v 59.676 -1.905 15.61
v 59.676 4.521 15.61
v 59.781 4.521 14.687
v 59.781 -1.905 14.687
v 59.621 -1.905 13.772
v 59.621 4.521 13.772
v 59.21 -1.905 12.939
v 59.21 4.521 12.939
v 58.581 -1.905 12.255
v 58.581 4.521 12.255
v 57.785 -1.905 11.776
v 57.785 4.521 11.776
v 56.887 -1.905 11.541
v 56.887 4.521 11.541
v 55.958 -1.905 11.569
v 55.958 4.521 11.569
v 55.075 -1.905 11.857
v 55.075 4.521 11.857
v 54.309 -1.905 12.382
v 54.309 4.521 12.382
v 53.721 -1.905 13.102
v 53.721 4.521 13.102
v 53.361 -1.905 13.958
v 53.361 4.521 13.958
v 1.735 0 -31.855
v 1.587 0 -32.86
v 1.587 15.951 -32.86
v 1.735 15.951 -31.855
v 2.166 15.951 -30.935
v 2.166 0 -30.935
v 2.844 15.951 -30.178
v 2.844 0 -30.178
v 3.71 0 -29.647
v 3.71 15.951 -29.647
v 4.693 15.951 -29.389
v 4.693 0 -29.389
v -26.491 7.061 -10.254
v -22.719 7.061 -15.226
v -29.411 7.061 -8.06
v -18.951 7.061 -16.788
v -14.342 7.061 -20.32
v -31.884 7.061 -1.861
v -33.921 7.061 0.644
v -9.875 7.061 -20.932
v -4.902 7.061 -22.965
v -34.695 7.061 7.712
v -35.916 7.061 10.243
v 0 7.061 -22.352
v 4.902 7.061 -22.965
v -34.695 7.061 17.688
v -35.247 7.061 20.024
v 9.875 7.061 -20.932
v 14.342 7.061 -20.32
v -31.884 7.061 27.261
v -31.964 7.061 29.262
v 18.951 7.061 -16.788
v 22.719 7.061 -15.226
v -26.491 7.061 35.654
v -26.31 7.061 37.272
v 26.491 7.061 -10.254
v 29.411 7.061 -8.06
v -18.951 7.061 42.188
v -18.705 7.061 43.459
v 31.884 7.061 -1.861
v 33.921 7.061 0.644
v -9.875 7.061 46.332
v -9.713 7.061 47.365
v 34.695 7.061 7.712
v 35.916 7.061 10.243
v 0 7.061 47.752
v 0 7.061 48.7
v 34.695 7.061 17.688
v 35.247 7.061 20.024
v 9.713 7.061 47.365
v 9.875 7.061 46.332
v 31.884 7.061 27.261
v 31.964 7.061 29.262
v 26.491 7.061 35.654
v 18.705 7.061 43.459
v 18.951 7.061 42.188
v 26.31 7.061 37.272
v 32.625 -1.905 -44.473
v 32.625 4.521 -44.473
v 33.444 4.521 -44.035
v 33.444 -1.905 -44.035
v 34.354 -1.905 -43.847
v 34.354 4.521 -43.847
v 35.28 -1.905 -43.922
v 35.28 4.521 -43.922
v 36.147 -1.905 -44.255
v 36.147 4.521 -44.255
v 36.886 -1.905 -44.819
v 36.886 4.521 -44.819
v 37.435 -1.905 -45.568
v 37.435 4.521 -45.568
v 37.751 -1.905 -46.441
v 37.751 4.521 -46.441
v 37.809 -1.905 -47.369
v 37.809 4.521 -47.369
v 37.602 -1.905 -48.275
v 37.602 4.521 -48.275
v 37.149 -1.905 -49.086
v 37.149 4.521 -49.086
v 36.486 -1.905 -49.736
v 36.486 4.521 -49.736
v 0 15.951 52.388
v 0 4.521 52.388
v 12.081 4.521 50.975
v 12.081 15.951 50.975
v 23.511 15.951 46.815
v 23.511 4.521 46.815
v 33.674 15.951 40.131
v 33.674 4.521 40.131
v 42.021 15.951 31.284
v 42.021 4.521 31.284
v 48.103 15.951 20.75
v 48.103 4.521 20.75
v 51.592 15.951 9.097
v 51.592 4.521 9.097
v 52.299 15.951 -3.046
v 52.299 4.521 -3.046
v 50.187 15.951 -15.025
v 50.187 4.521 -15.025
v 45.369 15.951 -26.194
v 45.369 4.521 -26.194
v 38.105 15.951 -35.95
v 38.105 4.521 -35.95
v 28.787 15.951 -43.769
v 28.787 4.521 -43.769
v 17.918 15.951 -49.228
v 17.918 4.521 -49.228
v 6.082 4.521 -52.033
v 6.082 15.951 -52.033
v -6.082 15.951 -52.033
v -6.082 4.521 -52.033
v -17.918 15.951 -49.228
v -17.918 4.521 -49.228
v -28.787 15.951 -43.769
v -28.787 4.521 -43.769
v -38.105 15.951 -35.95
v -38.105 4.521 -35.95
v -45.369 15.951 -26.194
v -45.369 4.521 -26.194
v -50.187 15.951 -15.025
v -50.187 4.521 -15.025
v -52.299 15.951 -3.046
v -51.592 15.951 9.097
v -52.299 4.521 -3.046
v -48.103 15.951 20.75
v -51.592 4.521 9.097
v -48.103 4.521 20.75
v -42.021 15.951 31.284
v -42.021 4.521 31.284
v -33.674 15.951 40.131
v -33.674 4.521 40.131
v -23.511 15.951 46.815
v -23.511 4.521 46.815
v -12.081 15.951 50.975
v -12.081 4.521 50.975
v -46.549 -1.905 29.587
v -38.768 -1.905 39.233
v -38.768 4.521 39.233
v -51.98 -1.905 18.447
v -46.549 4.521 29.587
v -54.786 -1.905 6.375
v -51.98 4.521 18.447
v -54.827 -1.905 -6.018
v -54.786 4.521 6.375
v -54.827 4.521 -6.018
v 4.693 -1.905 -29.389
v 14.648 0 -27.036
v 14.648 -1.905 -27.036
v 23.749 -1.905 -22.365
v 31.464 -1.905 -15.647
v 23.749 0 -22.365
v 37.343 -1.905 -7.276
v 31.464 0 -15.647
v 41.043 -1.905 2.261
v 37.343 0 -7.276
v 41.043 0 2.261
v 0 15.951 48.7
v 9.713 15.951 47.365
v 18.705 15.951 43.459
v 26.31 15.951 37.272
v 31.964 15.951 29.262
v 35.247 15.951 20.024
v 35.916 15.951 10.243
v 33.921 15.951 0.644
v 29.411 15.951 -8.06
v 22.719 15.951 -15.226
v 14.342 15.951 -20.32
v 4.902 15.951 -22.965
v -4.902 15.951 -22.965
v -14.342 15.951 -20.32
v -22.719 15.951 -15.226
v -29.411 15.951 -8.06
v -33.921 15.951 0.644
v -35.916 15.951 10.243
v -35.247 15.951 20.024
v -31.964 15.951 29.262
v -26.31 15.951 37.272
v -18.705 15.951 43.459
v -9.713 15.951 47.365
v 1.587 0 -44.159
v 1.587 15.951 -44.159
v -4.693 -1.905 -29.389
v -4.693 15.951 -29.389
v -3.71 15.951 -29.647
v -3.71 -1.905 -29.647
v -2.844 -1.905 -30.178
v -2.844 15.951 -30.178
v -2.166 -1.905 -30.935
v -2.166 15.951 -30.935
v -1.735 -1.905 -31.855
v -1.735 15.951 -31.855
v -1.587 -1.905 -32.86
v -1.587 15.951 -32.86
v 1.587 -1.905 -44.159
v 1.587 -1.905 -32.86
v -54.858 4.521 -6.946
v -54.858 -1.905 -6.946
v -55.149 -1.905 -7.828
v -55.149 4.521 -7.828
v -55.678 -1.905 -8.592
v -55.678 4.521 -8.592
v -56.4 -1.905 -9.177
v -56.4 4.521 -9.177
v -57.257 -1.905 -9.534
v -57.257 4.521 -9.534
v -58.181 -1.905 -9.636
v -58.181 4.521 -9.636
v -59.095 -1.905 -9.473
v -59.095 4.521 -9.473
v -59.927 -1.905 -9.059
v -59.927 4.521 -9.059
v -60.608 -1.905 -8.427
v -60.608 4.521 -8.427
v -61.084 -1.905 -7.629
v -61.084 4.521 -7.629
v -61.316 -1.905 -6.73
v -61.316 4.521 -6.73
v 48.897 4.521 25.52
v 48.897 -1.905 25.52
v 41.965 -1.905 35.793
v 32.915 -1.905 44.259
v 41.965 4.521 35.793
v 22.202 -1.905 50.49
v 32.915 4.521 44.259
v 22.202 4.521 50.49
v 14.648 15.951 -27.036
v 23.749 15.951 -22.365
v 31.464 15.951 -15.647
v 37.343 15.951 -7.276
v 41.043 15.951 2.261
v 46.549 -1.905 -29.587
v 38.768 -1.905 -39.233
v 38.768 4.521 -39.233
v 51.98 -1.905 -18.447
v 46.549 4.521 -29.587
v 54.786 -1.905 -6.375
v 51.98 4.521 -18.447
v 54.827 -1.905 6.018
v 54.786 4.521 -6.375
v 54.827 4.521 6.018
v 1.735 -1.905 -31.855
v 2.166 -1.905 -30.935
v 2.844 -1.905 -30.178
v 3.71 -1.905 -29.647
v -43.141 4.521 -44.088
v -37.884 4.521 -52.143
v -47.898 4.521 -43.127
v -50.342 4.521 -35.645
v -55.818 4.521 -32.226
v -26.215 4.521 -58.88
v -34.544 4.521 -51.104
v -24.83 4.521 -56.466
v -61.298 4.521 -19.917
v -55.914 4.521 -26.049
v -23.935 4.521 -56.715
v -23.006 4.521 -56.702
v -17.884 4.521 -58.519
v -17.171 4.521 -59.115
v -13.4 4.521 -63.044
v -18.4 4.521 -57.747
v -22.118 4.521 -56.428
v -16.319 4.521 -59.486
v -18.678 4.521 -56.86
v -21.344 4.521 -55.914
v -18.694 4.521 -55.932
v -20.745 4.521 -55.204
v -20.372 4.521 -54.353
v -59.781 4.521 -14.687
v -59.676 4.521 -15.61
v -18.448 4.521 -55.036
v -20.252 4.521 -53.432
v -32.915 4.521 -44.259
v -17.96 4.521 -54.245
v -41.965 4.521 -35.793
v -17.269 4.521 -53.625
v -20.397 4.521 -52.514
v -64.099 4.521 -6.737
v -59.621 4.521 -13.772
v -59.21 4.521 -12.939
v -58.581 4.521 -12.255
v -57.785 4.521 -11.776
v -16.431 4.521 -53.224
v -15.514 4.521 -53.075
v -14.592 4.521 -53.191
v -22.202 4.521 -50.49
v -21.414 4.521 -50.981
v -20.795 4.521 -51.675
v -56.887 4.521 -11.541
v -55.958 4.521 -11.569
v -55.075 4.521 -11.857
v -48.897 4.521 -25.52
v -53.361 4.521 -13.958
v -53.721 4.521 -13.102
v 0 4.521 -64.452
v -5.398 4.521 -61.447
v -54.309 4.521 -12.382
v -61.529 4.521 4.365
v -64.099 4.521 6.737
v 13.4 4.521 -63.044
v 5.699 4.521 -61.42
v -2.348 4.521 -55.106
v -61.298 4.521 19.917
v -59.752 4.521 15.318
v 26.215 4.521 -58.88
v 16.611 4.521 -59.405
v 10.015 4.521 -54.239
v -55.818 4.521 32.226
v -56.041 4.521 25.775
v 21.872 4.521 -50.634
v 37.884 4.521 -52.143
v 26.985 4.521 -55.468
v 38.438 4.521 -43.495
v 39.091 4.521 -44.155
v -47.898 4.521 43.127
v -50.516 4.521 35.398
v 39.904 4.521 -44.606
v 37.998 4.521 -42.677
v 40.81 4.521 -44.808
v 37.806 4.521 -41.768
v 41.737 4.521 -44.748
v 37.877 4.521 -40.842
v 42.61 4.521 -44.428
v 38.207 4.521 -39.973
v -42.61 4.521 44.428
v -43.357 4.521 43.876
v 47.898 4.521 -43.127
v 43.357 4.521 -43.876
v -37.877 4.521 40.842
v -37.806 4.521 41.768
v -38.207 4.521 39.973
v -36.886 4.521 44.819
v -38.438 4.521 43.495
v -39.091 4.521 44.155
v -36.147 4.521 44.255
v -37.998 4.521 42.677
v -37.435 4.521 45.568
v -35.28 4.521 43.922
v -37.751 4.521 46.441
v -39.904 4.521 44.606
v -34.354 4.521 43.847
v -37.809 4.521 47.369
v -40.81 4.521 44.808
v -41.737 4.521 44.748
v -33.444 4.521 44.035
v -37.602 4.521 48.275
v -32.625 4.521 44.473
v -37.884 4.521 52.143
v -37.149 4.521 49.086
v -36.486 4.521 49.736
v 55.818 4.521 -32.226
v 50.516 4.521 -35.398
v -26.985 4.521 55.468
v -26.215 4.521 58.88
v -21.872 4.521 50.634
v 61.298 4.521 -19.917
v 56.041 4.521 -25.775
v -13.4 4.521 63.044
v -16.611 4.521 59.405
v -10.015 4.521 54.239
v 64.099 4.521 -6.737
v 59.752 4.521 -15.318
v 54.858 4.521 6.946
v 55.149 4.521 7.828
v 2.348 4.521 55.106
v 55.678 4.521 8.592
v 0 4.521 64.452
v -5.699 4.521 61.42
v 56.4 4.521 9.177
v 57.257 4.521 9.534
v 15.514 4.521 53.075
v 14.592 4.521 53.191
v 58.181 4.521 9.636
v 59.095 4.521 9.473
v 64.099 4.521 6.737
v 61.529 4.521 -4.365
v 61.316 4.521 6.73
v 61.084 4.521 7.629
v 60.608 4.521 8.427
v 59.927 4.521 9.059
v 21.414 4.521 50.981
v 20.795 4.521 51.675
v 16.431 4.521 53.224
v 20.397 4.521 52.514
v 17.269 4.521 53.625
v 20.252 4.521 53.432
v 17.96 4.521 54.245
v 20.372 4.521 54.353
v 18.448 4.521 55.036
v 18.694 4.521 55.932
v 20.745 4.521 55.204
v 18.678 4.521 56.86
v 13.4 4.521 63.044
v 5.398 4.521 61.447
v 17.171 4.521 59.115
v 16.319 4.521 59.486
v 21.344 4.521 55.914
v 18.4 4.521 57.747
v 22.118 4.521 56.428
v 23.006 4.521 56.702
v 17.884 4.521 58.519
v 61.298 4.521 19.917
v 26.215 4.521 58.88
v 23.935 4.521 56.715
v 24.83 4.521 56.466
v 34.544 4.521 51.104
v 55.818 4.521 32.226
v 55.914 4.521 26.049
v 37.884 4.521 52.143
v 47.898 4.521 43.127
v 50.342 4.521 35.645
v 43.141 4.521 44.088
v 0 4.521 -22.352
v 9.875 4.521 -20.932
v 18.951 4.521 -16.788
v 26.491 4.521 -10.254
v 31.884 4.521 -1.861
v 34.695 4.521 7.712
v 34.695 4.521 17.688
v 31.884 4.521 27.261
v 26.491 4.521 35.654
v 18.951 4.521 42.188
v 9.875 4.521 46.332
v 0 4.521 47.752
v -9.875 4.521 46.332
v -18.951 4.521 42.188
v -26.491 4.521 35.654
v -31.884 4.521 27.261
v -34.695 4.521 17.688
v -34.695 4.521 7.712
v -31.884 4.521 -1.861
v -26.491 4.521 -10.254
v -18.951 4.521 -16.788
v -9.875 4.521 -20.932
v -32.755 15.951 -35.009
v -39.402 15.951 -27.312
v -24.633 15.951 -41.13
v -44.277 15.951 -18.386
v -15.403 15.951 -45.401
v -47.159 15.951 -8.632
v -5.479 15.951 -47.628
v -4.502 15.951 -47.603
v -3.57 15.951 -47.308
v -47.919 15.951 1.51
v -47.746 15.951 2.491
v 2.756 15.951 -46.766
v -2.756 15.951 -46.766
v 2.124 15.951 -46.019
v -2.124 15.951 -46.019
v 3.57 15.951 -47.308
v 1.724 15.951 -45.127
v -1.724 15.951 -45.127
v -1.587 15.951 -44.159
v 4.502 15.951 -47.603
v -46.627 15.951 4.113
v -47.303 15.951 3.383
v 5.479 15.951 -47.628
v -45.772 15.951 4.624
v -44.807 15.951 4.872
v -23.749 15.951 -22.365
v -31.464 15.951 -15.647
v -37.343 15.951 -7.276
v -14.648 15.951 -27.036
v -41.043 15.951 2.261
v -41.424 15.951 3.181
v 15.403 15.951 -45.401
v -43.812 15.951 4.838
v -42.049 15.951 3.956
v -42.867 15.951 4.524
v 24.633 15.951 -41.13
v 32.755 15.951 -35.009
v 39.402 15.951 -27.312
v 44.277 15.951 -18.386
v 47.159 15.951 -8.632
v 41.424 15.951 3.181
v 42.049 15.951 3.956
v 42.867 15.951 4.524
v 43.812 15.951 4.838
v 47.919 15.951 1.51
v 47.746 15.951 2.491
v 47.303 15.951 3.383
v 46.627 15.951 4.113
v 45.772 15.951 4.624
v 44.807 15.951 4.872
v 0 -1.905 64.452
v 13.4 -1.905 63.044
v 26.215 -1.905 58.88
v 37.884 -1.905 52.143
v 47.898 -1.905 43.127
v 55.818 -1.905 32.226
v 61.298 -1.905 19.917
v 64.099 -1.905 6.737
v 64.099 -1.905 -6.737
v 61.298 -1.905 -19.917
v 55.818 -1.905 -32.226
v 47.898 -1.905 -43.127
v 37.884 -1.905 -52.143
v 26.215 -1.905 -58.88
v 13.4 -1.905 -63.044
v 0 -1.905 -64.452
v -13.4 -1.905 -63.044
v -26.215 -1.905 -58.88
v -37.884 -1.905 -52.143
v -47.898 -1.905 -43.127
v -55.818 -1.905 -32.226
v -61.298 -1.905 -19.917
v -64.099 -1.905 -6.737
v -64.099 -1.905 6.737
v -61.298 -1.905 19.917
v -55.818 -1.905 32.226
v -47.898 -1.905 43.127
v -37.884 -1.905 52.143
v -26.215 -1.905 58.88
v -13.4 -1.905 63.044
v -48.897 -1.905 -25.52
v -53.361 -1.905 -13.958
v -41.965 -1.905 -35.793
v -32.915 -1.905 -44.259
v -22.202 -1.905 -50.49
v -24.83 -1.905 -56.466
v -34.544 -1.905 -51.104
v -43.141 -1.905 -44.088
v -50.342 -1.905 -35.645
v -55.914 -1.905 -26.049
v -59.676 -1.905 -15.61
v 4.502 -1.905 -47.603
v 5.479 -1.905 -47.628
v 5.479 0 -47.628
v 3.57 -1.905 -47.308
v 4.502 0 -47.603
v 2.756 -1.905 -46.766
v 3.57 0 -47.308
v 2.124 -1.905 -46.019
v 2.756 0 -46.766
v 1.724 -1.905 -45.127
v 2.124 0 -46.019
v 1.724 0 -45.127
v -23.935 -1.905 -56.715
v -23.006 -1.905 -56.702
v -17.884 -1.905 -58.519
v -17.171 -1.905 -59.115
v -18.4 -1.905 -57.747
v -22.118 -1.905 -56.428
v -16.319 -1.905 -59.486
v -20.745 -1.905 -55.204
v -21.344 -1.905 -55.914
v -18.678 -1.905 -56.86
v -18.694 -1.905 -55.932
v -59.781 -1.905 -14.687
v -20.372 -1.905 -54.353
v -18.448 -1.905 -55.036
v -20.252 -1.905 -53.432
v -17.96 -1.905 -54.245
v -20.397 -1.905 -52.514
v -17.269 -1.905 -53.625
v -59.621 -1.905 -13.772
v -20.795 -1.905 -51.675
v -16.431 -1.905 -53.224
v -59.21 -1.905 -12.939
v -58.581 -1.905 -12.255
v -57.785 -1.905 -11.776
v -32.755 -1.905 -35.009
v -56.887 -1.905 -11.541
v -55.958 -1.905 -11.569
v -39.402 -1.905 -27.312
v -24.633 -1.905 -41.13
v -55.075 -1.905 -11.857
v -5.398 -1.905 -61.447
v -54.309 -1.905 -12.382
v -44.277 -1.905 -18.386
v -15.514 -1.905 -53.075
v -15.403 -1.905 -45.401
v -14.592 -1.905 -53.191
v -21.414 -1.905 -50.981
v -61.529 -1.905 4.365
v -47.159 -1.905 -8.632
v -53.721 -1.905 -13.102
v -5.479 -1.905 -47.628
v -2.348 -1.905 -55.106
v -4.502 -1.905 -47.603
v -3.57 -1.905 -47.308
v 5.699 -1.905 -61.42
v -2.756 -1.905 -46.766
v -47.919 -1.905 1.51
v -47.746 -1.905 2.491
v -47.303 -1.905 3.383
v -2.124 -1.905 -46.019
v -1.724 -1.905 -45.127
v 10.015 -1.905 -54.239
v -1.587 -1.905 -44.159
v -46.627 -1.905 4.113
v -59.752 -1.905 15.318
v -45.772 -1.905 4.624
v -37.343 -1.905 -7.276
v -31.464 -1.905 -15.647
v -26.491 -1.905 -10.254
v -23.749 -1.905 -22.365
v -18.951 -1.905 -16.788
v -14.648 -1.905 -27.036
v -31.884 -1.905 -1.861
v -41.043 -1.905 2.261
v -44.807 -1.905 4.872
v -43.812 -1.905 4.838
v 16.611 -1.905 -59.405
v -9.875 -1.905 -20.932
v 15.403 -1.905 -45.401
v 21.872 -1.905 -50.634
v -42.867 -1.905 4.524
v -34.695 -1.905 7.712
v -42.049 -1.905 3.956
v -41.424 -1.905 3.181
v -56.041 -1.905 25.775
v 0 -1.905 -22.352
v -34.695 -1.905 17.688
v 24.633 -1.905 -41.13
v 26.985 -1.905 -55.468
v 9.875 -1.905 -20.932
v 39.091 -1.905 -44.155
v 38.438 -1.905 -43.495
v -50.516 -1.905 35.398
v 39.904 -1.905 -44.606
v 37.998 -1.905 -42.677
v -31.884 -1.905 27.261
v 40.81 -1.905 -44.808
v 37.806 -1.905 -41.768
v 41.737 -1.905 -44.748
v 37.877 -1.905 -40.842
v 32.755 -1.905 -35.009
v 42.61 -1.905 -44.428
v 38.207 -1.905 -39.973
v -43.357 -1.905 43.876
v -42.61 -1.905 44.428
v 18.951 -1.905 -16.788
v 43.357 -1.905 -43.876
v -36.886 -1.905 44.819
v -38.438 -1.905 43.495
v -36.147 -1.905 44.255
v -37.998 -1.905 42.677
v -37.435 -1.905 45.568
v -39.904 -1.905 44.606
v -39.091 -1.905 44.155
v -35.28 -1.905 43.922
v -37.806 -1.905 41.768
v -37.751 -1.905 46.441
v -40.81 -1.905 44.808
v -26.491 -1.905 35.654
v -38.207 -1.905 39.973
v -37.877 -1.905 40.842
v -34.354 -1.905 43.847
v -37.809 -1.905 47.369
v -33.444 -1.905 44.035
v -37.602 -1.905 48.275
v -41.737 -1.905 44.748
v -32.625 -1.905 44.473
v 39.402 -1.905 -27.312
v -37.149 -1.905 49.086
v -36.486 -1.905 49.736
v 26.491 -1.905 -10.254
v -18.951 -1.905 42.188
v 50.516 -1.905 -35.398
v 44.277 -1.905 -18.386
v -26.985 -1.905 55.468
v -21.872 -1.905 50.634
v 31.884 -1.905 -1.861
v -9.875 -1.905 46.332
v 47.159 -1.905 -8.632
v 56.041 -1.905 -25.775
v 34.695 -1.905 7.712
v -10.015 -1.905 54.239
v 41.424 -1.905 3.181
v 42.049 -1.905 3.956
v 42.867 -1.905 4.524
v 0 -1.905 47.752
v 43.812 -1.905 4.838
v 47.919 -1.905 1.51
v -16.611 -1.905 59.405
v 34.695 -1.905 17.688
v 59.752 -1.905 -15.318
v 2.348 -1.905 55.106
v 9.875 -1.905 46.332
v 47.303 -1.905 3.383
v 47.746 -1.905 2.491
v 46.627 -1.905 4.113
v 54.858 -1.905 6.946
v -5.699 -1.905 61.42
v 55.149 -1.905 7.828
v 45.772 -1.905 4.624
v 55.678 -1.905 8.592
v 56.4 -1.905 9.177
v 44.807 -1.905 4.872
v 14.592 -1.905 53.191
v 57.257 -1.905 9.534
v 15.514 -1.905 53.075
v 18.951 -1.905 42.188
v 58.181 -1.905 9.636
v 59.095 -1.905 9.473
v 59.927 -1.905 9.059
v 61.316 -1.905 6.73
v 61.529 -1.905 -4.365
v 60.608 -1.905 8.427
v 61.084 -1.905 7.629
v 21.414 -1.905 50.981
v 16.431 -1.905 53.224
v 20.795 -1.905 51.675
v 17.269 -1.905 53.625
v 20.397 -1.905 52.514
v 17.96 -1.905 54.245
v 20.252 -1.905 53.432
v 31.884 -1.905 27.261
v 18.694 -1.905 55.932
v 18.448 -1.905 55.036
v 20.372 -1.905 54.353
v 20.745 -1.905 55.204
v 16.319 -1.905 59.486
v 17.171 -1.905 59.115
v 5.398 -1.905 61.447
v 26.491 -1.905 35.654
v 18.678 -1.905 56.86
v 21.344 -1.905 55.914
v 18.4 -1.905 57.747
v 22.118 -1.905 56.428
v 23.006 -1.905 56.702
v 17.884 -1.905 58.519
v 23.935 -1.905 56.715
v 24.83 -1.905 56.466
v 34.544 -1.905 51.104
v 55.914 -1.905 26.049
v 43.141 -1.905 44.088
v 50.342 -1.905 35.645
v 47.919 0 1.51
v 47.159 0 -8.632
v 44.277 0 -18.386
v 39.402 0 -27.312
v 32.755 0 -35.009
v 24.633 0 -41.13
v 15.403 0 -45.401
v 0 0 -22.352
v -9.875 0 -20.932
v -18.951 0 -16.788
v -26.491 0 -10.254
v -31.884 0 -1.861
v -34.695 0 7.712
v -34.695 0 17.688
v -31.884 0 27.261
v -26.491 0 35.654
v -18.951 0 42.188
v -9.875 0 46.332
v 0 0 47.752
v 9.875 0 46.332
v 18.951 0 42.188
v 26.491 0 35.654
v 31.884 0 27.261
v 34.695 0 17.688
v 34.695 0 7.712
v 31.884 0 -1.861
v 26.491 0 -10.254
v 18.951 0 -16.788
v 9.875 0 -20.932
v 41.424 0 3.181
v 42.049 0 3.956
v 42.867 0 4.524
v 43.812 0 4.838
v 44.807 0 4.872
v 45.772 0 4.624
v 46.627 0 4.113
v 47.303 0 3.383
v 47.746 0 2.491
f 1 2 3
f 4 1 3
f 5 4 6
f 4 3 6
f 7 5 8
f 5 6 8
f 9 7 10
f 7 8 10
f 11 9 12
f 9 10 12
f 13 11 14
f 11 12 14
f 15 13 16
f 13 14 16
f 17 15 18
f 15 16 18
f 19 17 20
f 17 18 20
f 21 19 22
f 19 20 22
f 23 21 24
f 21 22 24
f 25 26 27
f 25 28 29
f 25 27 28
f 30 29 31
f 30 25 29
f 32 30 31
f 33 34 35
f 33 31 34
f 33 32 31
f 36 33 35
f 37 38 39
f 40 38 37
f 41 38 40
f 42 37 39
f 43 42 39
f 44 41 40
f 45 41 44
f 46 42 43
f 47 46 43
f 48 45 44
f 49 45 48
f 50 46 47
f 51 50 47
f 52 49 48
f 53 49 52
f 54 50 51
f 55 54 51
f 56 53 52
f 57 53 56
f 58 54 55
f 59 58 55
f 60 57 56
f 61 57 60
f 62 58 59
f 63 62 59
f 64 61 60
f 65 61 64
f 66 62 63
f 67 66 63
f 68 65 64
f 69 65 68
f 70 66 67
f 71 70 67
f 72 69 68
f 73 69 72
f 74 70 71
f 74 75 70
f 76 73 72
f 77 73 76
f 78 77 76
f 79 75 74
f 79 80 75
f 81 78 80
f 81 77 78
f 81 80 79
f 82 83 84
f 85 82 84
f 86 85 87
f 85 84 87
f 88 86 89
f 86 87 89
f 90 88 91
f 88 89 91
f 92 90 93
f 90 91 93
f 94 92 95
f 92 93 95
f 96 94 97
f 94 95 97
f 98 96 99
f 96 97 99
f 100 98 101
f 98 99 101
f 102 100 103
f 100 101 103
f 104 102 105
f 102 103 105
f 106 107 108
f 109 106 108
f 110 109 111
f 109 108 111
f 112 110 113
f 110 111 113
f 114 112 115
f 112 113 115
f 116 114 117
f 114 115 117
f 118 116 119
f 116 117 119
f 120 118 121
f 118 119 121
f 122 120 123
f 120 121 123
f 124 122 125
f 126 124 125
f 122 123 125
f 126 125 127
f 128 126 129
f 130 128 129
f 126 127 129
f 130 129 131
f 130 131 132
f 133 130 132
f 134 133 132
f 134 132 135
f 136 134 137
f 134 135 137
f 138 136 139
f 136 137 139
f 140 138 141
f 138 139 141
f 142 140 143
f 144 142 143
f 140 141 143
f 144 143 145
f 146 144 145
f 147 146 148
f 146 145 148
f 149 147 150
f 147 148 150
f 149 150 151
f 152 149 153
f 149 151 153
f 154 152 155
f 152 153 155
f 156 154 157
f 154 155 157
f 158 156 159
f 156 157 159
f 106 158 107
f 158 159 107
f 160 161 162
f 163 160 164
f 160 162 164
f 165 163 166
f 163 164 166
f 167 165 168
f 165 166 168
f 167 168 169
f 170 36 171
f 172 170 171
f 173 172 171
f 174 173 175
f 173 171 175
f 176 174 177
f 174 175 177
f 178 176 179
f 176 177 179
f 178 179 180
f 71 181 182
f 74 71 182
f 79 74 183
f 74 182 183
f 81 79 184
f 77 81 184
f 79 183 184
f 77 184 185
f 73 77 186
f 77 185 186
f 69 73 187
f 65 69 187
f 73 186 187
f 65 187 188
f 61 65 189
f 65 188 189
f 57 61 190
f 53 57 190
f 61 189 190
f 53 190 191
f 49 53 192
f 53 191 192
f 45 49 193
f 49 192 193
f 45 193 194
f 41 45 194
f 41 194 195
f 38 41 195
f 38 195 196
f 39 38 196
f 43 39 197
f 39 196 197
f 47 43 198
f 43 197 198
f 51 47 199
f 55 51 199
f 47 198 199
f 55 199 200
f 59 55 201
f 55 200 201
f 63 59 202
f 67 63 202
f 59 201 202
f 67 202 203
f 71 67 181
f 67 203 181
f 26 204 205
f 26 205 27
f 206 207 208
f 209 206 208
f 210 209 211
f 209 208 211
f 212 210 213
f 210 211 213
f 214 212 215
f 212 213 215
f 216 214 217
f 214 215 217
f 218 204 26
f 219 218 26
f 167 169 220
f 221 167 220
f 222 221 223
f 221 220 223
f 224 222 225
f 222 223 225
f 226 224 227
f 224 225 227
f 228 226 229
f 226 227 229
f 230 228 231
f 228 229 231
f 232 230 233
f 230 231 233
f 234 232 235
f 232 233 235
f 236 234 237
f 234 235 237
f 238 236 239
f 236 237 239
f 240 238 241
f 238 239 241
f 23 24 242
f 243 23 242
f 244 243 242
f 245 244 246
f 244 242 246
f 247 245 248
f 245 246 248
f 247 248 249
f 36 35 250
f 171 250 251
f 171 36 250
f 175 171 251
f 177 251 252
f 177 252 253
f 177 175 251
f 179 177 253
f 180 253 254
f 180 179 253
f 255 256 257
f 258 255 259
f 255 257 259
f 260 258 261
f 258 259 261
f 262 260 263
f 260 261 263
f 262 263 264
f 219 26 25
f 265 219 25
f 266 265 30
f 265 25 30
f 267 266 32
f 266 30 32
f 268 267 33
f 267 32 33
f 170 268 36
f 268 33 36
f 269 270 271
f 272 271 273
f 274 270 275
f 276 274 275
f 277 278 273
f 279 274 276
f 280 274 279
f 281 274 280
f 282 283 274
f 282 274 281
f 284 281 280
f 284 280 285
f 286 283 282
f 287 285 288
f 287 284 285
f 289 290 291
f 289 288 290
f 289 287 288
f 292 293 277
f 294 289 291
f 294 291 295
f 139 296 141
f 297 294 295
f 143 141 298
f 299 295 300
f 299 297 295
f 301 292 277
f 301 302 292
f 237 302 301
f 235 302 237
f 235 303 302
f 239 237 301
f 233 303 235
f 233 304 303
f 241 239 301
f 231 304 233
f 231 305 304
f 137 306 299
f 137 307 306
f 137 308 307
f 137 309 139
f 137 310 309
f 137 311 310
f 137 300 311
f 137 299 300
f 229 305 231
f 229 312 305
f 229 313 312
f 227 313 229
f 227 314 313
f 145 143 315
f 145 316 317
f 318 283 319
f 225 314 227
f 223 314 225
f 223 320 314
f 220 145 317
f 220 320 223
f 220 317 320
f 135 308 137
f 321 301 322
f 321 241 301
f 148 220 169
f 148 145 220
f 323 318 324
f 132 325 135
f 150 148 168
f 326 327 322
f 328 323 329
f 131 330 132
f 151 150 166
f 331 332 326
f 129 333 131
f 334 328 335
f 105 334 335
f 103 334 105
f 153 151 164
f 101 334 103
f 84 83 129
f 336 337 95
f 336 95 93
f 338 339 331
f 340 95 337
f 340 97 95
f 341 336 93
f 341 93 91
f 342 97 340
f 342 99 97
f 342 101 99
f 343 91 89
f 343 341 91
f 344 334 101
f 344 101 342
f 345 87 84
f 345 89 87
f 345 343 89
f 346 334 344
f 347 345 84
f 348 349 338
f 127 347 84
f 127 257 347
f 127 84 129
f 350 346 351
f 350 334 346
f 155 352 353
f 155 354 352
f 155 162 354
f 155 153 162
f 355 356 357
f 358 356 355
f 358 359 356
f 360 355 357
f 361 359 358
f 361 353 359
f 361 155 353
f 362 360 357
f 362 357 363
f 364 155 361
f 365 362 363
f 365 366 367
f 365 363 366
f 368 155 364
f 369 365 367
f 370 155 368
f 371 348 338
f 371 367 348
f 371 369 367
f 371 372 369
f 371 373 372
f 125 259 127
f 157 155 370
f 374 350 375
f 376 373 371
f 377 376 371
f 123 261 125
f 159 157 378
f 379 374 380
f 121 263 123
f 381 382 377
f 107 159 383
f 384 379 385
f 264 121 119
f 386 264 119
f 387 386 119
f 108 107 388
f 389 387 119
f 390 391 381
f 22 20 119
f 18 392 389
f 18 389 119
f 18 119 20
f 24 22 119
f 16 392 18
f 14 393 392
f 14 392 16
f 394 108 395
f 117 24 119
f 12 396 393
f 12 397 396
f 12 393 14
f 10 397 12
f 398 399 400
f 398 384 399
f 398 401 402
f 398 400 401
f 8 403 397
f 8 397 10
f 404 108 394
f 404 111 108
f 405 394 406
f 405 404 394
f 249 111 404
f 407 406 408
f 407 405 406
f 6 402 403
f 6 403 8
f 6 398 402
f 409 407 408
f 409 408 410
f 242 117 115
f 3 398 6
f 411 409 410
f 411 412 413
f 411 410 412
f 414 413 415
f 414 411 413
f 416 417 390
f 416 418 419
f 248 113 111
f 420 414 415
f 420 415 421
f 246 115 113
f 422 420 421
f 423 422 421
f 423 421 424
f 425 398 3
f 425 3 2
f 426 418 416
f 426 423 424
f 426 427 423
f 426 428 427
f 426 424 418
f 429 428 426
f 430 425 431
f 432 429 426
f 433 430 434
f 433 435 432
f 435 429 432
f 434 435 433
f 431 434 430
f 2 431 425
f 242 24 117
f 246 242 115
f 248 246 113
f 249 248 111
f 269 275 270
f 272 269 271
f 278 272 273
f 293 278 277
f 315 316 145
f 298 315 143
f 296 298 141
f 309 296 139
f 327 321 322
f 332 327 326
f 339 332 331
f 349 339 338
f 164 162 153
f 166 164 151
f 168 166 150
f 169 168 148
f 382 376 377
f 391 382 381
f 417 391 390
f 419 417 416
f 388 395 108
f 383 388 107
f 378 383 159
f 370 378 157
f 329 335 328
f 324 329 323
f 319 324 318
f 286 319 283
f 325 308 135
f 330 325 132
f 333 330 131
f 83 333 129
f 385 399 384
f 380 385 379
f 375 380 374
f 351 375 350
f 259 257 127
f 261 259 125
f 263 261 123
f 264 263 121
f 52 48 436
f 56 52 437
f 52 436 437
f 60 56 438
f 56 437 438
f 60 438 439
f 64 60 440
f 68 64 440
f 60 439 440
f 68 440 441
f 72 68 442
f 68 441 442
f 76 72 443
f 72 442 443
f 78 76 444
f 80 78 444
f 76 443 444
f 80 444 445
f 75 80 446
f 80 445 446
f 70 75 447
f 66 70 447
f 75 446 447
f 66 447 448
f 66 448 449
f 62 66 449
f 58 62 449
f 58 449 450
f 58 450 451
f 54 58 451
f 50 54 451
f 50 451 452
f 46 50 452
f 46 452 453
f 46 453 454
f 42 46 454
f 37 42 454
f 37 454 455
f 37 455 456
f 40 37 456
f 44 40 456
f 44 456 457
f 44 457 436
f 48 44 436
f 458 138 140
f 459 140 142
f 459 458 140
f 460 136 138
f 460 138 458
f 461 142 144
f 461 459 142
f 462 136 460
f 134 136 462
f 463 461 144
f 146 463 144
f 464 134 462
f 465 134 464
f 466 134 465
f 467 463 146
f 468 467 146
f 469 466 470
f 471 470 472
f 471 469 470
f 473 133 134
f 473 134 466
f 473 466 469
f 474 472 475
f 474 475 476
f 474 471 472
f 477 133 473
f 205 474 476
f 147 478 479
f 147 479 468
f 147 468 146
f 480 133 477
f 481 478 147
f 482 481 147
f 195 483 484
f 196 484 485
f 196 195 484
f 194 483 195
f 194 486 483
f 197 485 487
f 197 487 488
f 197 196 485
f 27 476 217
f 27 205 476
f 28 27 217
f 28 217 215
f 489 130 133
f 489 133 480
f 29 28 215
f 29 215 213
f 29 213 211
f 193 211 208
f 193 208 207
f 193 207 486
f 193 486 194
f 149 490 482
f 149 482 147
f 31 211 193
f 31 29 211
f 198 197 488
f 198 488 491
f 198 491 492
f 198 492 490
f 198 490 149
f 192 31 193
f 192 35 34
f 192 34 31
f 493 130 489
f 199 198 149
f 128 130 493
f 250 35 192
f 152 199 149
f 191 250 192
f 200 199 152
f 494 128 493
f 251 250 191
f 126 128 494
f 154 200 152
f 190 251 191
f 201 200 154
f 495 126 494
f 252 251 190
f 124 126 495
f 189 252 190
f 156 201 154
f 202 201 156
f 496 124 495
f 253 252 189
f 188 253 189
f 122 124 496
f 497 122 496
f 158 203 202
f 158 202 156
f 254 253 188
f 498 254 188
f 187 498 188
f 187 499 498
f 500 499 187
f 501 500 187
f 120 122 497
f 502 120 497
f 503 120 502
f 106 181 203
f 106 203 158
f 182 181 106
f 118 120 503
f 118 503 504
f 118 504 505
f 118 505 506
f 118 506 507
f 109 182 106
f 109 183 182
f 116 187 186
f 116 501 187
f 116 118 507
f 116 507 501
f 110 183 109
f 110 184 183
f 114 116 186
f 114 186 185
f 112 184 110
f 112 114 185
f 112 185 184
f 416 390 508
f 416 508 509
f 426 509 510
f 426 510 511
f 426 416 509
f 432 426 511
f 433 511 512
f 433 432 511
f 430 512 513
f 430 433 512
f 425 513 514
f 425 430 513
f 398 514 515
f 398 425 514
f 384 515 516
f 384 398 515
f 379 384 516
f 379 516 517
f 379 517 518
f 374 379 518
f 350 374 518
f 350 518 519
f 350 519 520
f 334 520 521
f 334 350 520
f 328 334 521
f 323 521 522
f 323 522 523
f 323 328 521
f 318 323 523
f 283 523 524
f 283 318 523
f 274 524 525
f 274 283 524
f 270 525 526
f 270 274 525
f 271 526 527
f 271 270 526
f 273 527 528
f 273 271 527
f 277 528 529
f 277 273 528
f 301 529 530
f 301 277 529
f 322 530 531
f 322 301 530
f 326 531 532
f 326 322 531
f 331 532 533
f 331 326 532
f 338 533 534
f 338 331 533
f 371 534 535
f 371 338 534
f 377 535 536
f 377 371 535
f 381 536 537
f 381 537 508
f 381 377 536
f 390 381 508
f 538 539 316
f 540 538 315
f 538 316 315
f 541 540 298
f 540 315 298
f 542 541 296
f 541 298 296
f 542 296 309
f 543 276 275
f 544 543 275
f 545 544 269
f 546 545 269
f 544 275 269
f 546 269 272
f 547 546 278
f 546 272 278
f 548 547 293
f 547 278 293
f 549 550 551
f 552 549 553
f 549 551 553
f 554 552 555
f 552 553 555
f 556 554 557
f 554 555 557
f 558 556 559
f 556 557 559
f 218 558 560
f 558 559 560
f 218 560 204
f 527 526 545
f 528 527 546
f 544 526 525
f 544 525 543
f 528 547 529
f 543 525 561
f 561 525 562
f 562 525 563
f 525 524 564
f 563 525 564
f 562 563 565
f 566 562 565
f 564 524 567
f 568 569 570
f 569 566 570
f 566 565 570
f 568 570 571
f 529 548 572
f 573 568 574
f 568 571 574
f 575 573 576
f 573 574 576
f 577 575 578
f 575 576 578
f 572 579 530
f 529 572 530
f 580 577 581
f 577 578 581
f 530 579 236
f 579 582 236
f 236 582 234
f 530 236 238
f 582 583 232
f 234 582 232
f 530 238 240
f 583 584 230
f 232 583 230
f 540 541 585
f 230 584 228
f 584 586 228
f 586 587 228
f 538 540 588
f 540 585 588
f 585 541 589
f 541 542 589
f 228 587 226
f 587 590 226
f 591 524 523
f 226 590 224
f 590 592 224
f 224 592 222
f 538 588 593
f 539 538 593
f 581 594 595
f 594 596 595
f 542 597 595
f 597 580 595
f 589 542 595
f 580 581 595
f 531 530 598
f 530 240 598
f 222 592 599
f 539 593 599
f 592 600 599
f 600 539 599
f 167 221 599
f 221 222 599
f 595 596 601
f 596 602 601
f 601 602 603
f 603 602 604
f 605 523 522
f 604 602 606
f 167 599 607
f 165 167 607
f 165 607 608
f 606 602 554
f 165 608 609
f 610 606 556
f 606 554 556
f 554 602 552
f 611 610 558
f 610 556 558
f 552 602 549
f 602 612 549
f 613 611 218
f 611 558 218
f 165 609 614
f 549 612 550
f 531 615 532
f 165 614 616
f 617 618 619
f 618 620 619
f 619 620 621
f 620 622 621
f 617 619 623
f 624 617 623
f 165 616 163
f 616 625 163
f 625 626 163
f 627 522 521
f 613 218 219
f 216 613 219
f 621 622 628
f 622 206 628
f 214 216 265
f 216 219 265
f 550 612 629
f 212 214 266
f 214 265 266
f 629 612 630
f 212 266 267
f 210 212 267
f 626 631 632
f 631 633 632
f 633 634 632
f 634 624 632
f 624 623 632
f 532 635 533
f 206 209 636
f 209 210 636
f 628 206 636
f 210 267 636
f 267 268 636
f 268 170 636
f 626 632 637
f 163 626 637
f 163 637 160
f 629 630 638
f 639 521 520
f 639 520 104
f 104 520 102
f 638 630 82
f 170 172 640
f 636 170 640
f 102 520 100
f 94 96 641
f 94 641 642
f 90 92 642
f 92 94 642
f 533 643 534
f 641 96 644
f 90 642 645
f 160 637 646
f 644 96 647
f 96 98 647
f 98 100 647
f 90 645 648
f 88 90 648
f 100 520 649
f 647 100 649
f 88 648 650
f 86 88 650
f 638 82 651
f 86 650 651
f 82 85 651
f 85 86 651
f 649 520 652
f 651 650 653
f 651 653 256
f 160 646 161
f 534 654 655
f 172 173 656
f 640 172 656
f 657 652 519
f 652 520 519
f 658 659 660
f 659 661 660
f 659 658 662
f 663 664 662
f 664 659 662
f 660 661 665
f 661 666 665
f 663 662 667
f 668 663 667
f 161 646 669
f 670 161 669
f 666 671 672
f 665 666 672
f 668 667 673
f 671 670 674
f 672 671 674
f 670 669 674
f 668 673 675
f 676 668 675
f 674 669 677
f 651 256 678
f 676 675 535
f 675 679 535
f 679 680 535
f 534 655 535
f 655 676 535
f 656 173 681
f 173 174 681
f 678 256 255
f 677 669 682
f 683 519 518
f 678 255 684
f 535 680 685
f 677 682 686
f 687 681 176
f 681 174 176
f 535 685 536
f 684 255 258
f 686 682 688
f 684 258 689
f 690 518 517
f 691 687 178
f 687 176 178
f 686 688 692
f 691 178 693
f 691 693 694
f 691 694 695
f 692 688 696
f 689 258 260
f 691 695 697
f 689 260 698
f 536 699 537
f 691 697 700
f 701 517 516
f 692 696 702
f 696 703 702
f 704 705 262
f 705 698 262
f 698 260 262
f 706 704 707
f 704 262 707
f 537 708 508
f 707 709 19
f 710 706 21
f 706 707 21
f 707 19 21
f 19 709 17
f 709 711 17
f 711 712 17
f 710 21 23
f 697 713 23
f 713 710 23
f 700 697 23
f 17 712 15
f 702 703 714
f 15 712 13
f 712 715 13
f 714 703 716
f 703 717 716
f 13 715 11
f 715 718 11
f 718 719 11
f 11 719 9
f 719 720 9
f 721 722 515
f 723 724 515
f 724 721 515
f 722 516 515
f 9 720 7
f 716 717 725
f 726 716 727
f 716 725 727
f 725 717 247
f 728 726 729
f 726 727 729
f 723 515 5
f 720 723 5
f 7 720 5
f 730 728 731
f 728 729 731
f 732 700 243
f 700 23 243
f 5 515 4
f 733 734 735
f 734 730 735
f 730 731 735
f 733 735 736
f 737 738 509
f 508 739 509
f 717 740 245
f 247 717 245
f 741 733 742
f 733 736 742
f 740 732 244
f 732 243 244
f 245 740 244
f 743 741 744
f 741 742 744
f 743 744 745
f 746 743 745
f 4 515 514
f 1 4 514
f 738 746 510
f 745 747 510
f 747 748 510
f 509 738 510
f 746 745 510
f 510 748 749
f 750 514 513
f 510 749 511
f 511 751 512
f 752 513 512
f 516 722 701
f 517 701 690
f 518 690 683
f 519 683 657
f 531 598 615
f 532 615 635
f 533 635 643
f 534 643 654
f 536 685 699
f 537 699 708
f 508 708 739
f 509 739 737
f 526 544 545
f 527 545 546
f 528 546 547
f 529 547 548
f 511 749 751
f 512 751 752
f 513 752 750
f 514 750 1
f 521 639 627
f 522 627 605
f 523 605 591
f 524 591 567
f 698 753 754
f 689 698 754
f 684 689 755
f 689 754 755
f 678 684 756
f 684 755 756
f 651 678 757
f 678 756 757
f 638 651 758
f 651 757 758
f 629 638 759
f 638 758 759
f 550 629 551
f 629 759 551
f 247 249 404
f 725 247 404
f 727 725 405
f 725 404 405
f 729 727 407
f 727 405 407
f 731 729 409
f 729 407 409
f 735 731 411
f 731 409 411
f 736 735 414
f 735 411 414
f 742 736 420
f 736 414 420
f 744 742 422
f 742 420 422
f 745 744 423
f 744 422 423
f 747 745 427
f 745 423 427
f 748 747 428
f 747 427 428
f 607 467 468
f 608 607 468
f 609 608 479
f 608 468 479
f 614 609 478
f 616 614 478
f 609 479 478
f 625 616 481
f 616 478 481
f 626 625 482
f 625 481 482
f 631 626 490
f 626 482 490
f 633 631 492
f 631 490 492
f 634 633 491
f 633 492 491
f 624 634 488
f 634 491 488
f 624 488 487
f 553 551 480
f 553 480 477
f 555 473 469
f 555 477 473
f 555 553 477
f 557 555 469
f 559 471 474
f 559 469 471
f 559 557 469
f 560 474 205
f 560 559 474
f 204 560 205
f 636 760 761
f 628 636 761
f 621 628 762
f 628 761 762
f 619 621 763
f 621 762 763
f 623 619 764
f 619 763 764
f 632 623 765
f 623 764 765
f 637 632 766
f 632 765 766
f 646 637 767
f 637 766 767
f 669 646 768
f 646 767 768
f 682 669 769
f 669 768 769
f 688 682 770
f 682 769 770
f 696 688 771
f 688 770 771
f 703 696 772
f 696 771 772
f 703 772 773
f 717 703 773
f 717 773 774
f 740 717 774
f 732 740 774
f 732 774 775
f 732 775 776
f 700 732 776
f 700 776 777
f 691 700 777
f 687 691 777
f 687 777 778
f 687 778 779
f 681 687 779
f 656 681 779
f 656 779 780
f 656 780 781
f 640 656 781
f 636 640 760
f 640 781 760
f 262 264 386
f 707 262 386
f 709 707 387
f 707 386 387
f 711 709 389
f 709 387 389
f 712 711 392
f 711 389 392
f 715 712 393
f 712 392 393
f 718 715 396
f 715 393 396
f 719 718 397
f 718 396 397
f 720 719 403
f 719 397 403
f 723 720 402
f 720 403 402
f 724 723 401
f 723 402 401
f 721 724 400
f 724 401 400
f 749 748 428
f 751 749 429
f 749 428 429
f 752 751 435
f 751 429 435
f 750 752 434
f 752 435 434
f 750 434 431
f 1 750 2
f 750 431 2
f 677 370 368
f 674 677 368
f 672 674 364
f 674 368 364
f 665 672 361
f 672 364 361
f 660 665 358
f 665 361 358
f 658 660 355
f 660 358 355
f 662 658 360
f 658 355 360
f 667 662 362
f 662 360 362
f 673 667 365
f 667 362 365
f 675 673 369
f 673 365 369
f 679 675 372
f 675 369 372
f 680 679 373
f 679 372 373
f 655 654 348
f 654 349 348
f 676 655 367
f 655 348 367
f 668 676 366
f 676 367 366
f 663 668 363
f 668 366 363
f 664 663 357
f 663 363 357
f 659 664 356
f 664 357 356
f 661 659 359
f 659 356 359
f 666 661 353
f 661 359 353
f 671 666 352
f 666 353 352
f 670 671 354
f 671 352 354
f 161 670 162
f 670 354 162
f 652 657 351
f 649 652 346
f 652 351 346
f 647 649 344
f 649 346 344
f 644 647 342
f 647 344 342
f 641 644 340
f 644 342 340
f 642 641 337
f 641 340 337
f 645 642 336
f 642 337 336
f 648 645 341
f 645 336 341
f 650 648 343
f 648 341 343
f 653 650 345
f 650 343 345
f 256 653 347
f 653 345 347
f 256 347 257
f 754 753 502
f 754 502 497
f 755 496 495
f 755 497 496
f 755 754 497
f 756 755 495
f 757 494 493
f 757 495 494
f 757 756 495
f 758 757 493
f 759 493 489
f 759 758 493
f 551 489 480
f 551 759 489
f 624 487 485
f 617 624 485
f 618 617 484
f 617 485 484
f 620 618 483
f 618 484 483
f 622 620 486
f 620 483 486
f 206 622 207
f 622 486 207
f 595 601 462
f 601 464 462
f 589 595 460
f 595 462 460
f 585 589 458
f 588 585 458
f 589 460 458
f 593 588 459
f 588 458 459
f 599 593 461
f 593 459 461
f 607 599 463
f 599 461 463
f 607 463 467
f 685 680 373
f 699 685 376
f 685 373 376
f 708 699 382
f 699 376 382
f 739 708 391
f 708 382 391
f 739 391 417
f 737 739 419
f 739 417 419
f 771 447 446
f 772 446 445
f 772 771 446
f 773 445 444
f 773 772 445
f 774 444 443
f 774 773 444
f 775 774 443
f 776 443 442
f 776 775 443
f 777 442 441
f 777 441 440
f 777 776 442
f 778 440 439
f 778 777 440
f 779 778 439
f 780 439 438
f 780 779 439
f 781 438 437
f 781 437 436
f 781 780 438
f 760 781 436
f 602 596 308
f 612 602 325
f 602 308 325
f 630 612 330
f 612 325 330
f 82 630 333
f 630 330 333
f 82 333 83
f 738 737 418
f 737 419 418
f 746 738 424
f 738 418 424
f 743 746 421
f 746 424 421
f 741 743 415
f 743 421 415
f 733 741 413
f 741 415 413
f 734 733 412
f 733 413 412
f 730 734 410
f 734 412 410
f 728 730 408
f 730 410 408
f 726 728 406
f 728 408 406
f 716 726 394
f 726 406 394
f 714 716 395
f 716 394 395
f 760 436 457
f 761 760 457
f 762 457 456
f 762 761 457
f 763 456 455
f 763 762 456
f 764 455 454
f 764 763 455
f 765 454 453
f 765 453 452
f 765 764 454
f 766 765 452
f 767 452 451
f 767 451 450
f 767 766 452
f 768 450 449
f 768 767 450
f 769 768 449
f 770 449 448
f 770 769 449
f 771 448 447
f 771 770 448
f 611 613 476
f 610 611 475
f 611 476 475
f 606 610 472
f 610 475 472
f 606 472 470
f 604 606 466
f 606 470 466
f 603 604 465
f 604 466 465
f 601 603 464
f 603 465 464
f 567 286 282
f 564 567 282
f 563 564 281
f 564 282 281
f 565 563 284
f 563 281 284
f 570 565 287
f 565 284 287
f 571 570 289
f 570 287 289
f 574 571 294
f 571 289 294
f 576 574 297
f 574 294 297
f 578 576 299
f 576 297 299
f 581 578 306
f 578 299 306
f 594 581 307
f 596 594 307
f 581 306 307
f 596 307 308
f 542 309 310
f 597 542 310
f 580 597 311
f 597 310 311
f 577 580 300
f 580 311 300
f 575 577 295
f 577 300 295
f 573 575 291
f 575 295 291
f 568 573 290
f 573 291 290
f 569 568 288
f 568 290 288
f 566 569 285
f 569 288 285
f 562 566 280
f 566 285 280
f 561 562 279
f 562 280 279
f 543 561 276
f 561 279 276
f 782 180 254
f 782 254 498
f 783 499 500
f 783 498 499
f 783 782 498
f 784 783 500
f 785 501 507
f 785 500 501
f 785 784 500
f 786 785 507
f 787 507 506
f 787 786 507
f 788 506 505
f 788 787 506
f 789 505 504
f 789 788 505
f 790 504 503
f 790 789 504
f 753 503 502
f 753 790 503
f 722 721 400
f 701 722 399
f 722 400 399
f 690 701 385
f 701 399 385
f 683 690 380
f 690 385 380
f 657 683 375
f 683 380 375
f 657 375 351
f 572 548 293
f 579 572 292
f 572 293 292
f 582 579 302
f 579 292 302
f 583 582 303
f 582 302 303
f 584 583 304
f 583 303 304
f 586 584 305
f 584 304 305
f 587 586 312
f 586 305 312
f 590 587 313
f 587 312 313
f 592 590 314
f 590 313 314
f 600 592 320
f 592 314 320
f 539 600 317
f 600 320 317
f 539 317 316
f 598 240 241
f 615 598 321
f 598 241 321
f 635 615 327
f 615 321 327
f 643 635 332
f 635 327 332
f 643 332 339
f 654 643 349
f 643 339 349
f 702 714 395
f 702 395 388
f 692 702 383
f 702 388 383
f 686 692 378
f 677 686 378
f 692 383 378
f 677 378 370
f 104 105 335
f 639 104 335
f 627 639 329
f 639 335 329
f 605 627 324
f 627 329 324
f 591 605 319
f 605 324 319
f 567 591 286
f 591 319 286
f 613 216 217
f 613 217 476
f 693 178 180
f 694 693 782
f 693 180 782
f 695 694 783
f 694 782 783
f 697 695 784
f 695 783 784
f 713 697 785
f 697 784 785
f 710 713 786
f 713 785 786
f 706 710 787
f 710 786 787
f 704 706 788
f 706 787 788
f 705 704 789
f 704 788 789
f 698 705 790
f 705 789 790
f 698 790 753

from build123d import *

# Parameters (mm, degrees)
SKETCH1_R               = 61.912499999999994
SKETCH1_R_2             = 35.05199999999999
BOSS_EXTRUDE1_DEPTH     = 4.521199999999999
SKETCH3_R               = 52.38750000000001
BOSS_EXTRUDE2_DEPTH     = 11.43
SKETCH4_R               = 35.05199999999999
CUT_EXTRUDE1_DEPTH      = 89.99862973068743
SKETCH9_R               = 36.000000009
CUT_EXTRUDE3_DEPTH      = 8.889999999999999
CUT_EXTRUDE6_DEPTH      = 4.5212
CIRPATTERN2_COUNT       = 6
CUT_EXTRUDE7_DEPTH      = 89.99862973068743
CUT_EXTRUDE7_DEPTH_BACK = 89.99862973068743
SKETCH28_R              = 61.912499999999994
BOSS_EXTRUDE6_DEPTH     = 1.9049999999999998
SKETCH29_R              = 64.4525
SKETCH29_R_2            = 61.912499999999994
BOSS_EXTRUDE7_DEPTH     = 6.4262


with BuildPart() as part:
    # Sketch1 → Boss-Extrude1 (new body)
    with BuildSketch(Plane(origin=(0, 0, 0), x_dir=(1, 0, 0), z_dir=(0, 1, 0))):
        with Locations(Location((0, 0, 0), (0, 0, 270))):
            Circle(SKETCH1_R)
        with Locations(Location((0, -12.7, 0), (0, 0, 270))):
            Circle(SKETCH1_R_2, mode=Mode.SUBTRACT)
    extrude(amount=BOSS_EXTRUDE1_DEPTH)

    # Sketch3 → Boss-Extrude2 (add)
    with BuildSketch(Plane(origin=(0, 4.521199999999999, 0), x_dir=(1, 0, 0), z_dir=(0, 1, 0))):
        with Locations(Location((0, 0, 0), (0, 0, 270))):
            Circle(SKETCH3_R)
    extrude(amount=BOSS_EXTRUDE2_DEPTH)

    # Sketch4 → Cut-Extrude1 (cut, through all)
    with BuildSketch(Plane.XZ):
        with Locations(Location((0, 12.7, 0), (0, 0, 270))):
            Circle(SKETCH4_R)
    extrude(amount=-CUT_EXTRUDE1_DEPTH, mode=Mode.SUBTRACT)

    # Sketch9 → Cut-Extrude3 (cut)
    with BuildSketch(Plane(origin=(0, 15.951199999999998, 0), x_dir=(1, 0, 0), z_dir=(0, 1, 0))):
        with Locations(Location((0, -12.7, 0), (0, 0, 270))):
            Circle(SKETCH9_R)
    extrude(amount=-CUT_EXTRUDE3_DEPTH, mode=Mode.SUBTRACT)

    # Sketch26 → Cut-Extrude6 (cut)
    with BuildSketch(Plane(origin=(0, 4.521199999999999, 0), x_dir=(1, 0, 0), z_dir=(0, 1, 0))):
        with BuildLine():
            ThreePointArc((-61.31569012651589, 6.729759543927394), (-58.13186307655321, -20.629833117571987), (-43.356751785354874, -43.87591131626929))
            ThreePointArc((-43.356751785354874, -43.87591131626929), (-38.740981882715914, -43.84844086137017), (-38.76845233761503, -39.23267095873121))
            ThreePointArc((-38.76845233761503, -39.23267095873121), (-51.979963216279714, -18.446647154542955), (-54.82685654096325, 6.017571690194909))
            ThreePointArc((-54.82685654096325, 6.017571690194909), (-57.71517940687332, 9.618082409837466), (-61.31569012651589, 6.729759543927394))
        make_face()
    cut_extrude6 = extrude(amount=-CUT_EXTRUDE6_DEPTH, mode=Mode.SUBTRACT)

    # CirPattern2: Cut-Extrude6 ×6 about axis
    cirpattern2_axis = Axis((1.126e-14, 0, 2.9e-14), (0, 1, 0))
    for i in range(1, CIRPATTERN2_COUNT):
        add(cut_extrude6.rotate(cirpattern2_axis, i * 360 / CIRPATTERN2_COUNT), mode=Mode.SUBTRACT)

    # Sketch27 → Cut-Extrude7 (cut, two sides: drawn at the far end of the back side and taken through both)
    with BuildSketch(Plane(origin=(0, 15.951199999999998, 0), x_dir=(1, 0, 0), z_dir=(0, 1, 0)).offset(-CUT_EXTRUDE7_DEPTH_BACK)):
        with BuildLine():
            Line((-1.5874999999999995, 44.15876017281289), (-1.5874999999999981, 32.860162500535104))
            ThreePointArc((-1.5874999999999981, 32.860162500535104), (-2.4771920261720077, 30.53144033991194), (-4.692981403795235, 29.38917231671267))
            ThreePointArc((-4.692981403795235, 29.38917231671267), (-27.80971442943092, 19.239666311904415), (-41.043217293560936, -2.2608039123771086))
            ThreePointArc((-41.043217293560936, -2.2608039123771086), (-44.807125891813406, -4.871764870752282), (-47.91871765916517, -1.509902033647368))
            ThreePointArc((-47.91871765916517, -1.509902033647368), (-36.283267418970276, 31.337003871676934), (-5.479142857142855, 47.62837704353388))
            ThreePointArc((-5.479142857142855, 47.62837704353388), (-2.7558281236719524, 46.76563211813081), (-1.5874999999999995, 44.15876017281289))
        make_face()
        with BuildLine():
            Line((1.5874999999999995, 44.15876017281289), (1.5874999999999981, 32.860162500535104))
            ThreePointArc((1.5874999999999981, 32.860162500535104), (2.4771920261720073, 30.53144033991194), (4.692981403795235, 29.38917231671267))
            ThreePointArc((4.692981403795235, 29.38917231671267), (27.809714429430915, 19.23966631190442), (41.043217293560936, -2.2608039123771086))
            ThreePointArc((41.043217293560936, -2.2608039123771086), (44.807125891813406, -4.871764870752282), (47.91871765916517, -1.509902033647368))
            ThreePointArc((47.91871765916517, -1.509902033647368), (36.28326741897028, 31.337003871676927), (5.479142857142855, 47.62837704353388))
            ThreePointArc((5.479142857142855, 47.62837704353388), (2.755828123671953, 46.76563211813081), (1.5874999999999995, 44.15876017281289))
        make_face()
    extrude(amount=CUT_EXTRUDE7_DEPTH + CUT_EXTRUDE7_DEPTH_BACK, mode=Mode.SUBTRACT)

    # Sketch28 → Boss-Extrude6 (add)
    with BuildSketch(Plane.XZ):
        with Locations(Location((0, 0, 0), (0, 0, 270))):
            Circle(SKETCH28_R)
        with BuildLine():
            ThreePointArc((-59.67602970675995, -15.610092813558284), (-57.34435464364428, -11.626454047298918), (-53.3607158773849, -13.958129110414555))
            ThreePointArc((-53.3607158773849, -13.958129110414557), (-41.96524665862243, -35.792645055806894), (-22.202058317679402, -50.490236419216366))
            ThreePointArc((-22.202058317679395, -50.490236419216366), (-20.528086000825798, -54.79185275524728), (-24.829702336856723, -56.465825072100834))
            ThreePointArc((-24.82970233685672, -56.465825072100834), (-46.93189109392796, -40.02875363482713), (-59.67602970675995, -15.610092813558284))
        make_face(mode=Mode.SUBTRACT)
        with BuildLine():
            Line((-1.5874999999999986, -32.860162500535104), (-1.5874999999999995, -44.15876017281289))
            ThreePointArc((-1.5874999999999977, -44.15876017281289), (-2.755828123671947, -46.76563211813081), (-5.4791428571428495, -47.62837704353388))
            ThreePointArc((-5.479142857142854, -47.62837704353389), (-36.28326741897027, -31.337003871676924), (-47.918717659165196, 1.5099020336473608))
            ThreePointArc((-47.918717659165196, 1.5099020336473605), (-44.80712589181342, 4.871764870752293), (-41.04321729356092, 2.2608039123771135))
            ThreePointArc((-41.04321729356093, 2.2608039123771135), (-27.8097144294309, -19.239666311904422), (-4.692981403795217, -29.389172316712667))
            ThreePointArc((-4.692981403795219, -29.38917231671267), (-2.4771920261720033, -30.531440339911942), (-1.587499999999999, -32.860162500535104))
        make_face(mode=Mode.SUBTRACT)
        with BuildLine():
            ThreePointArc((-16.319277921405433, -59.48600412982813), (-18.603372760928732, -55.47489490866959), (-14.592263539770187, -53.1908000691463))
            ThreePointArc((-14.592263539770187, -53.19080006914629), (10.014716557657184, -54.239292210350484), (32.62479822328402, -44.47266472902207))
            ThreePointArc((32.62479822328402, -44.47266472902206), (37.18709340604772, -45.173770345410375), (36.48598778965936, -49.73606552817407))
            ThreePointArc((36.48598778965937, -49.73606552817408), (11.199971982625161, -60.6585867523998), (-16.319277921405433, -59.48600412982813))
        make_face(mode=Mode.SUBTRACT)
        with BuildLine():
            Line((1.5874999999999995, -44.15876017281289), (1.5874999999999981, -32.860162500535104))
            ThreePointArc((1.5874999999999986, -32.860162500535104), (2.4771920261720077, -30.53144033991194), (4.692981403795235, -29.38917231671267))
            ThreePointArc((4.692981403795236, -29.389172316712674), (27.80971442943091, -19.239666311904415), (41.043217293560936, 2.260803912377108))
            ThreePointArc((41.043217293560936, 2.2608039123771118), (44.80712589181342, 4.871764870752304), (47.91871765916518, 1.509902033647373))
            ThreePointArc((47.918717659165196, 1.5099020336473767), (36.28326741897028, -31.337003871676927), (5.479142857142865, -47.62837704353388))
            ThreePointArc((5.479142857142865, -47.628377043533874), (2.755828123671944, -46.765632118130824), (1.587499999999999, -44.15876017281289))
        make_face(mode=Mode.SUBTRACT)
        with BuildLine():
            ThreePointArc((43.35675178535485, -43.8759113162693), (38.740981882715914, -43.848440861370165), (38.76845233761502, -39.232670958731234))
            ThreePointArc((38.76845233761502, -39.232670958731234), (51.9799632162797, -18.44664715454299), (54.82685654096326, 6.017571690194891))
            ThreePointArc((54.826856540963256, 6.017571690194889), (57.715179406873325, 9.61808240983748), (61.31569012651589, 6.729759543927382))
            ThreePointArc((61.3156901265159, 6.729759543927382), (58.131863076553195, -20.62983311757202), (43.35675178535486, -43.87591131626931))
        make_face(mode=Mode.SUBTRACT)
        with BuildLine():
            ThreePointArc((-43.356751785354874, 43.87591131626928), (-38.740981882715914, 43.84844086137017), (-38.76845233761503, 39.23267095873121))
            ThreePointArc((-38.76845233761503, 39.23267095873122), (-51.9799632162797, 18.446647154542973), (-54.82685654096326, -6.017571690194876))
            ThreePointArc((-54.826856540963256, -6.01757169019488), (-57.71517940687332, -9.618082409837479), (-61.31569012651589, -6.729759543927381))
            ThreePointArc((-61.31569012651589, -6.729759543927381), (-58.1318630765532, 20.629833117572), (-43.356751785354874, 43.875911316269274))
        make_face(mode=Mode.SUBTRACT)
        with BuildLine():
            ThreePointArc((16.31927792140503, 59.486004129828245), (18.603372760928355, 55.47489490866972), (14.592263539769828, 53.1908000691464))
            ThreePointArc((14.592263539769828, 53.1908000691464), (-10.014716557657586, 54.23929221035041), (-32.624798223284365, 44.472664729021815))
            ThreePointArc((-32.62479822328437, 44.472664729021815), (-37.187093406048064, 45.17377034541014), (-36.48598778965972, 49.73606552817383))
            ThreePointArc((-36.48598778965972, 49.73606552817383), (-11.19997198262558, 60.65858675239972), (16.31927792140503, 59.48600412982824))
        make_face(mode=Mode.SUBTRACT)
        with BuildLine():
            ThreePointArc((-1.342e-14, 47.75199999999998), (24.785506894150842, 37.48550689415085), (35.05199999999998, 12.7))
            ThreePointArc((35.05199999999998, 12.69999999999999), (24.785506894150842, -12.085506894150853), (-6.44e-15, -22.35199999999998))
            ThreePointArc((-6.44e-15, -22.35199999999998), (-35.05199999999998, 12.700000000000003), (-1.342e-14, 47.75199999999998))
        make_face(mode=Mode.SUBTRACT)
        with BuildLine():
            ThreePointArc((59.676029706759834, 15.61009281355871), (57.344354643644195, 11.626454047299315), (53.3607158773848, 13.958129110414966))
            ThreePointArc((53.3607158773848, 13.958129110414966), (41.96524665862217, 35.79264505580721), (22.20205831767902, 50.49023641921653))
            ThreePointArc((22.20205831767902, 50.49023641921653), (20.528086000825407, 54.79185275524743), (24.829702336856318, 56.465825072101026))
            ThreePointArc((24.829702336856318, 56.46582507210103), (46.931891093927675, 40.02875363482747), (59.676029706759834, 15.610092813558712))
        make_face(mode=Mode.SUBTRACT)
    extrude(amount=BOSS_EXTRUDE6_DEPTH)

    # Sketch29 → Boss-Extrude7 (add, through all)
    with BuildSketch(Plane(origin=(0, 4.521199999999999, 0), x_dir=(1, 0, 0), z_dir=(0, 1, 0))):
        with Locations(Location((0, 0, 0), (0, 0, 270))):
            Circle(SKETCH29_R)
        Circle(SKETCH29_R_2, mode=Mode.SUBTRACT)
    extrude(amount=-BOSS_EXTRUDE7_DEPTH)


solid = part.part
